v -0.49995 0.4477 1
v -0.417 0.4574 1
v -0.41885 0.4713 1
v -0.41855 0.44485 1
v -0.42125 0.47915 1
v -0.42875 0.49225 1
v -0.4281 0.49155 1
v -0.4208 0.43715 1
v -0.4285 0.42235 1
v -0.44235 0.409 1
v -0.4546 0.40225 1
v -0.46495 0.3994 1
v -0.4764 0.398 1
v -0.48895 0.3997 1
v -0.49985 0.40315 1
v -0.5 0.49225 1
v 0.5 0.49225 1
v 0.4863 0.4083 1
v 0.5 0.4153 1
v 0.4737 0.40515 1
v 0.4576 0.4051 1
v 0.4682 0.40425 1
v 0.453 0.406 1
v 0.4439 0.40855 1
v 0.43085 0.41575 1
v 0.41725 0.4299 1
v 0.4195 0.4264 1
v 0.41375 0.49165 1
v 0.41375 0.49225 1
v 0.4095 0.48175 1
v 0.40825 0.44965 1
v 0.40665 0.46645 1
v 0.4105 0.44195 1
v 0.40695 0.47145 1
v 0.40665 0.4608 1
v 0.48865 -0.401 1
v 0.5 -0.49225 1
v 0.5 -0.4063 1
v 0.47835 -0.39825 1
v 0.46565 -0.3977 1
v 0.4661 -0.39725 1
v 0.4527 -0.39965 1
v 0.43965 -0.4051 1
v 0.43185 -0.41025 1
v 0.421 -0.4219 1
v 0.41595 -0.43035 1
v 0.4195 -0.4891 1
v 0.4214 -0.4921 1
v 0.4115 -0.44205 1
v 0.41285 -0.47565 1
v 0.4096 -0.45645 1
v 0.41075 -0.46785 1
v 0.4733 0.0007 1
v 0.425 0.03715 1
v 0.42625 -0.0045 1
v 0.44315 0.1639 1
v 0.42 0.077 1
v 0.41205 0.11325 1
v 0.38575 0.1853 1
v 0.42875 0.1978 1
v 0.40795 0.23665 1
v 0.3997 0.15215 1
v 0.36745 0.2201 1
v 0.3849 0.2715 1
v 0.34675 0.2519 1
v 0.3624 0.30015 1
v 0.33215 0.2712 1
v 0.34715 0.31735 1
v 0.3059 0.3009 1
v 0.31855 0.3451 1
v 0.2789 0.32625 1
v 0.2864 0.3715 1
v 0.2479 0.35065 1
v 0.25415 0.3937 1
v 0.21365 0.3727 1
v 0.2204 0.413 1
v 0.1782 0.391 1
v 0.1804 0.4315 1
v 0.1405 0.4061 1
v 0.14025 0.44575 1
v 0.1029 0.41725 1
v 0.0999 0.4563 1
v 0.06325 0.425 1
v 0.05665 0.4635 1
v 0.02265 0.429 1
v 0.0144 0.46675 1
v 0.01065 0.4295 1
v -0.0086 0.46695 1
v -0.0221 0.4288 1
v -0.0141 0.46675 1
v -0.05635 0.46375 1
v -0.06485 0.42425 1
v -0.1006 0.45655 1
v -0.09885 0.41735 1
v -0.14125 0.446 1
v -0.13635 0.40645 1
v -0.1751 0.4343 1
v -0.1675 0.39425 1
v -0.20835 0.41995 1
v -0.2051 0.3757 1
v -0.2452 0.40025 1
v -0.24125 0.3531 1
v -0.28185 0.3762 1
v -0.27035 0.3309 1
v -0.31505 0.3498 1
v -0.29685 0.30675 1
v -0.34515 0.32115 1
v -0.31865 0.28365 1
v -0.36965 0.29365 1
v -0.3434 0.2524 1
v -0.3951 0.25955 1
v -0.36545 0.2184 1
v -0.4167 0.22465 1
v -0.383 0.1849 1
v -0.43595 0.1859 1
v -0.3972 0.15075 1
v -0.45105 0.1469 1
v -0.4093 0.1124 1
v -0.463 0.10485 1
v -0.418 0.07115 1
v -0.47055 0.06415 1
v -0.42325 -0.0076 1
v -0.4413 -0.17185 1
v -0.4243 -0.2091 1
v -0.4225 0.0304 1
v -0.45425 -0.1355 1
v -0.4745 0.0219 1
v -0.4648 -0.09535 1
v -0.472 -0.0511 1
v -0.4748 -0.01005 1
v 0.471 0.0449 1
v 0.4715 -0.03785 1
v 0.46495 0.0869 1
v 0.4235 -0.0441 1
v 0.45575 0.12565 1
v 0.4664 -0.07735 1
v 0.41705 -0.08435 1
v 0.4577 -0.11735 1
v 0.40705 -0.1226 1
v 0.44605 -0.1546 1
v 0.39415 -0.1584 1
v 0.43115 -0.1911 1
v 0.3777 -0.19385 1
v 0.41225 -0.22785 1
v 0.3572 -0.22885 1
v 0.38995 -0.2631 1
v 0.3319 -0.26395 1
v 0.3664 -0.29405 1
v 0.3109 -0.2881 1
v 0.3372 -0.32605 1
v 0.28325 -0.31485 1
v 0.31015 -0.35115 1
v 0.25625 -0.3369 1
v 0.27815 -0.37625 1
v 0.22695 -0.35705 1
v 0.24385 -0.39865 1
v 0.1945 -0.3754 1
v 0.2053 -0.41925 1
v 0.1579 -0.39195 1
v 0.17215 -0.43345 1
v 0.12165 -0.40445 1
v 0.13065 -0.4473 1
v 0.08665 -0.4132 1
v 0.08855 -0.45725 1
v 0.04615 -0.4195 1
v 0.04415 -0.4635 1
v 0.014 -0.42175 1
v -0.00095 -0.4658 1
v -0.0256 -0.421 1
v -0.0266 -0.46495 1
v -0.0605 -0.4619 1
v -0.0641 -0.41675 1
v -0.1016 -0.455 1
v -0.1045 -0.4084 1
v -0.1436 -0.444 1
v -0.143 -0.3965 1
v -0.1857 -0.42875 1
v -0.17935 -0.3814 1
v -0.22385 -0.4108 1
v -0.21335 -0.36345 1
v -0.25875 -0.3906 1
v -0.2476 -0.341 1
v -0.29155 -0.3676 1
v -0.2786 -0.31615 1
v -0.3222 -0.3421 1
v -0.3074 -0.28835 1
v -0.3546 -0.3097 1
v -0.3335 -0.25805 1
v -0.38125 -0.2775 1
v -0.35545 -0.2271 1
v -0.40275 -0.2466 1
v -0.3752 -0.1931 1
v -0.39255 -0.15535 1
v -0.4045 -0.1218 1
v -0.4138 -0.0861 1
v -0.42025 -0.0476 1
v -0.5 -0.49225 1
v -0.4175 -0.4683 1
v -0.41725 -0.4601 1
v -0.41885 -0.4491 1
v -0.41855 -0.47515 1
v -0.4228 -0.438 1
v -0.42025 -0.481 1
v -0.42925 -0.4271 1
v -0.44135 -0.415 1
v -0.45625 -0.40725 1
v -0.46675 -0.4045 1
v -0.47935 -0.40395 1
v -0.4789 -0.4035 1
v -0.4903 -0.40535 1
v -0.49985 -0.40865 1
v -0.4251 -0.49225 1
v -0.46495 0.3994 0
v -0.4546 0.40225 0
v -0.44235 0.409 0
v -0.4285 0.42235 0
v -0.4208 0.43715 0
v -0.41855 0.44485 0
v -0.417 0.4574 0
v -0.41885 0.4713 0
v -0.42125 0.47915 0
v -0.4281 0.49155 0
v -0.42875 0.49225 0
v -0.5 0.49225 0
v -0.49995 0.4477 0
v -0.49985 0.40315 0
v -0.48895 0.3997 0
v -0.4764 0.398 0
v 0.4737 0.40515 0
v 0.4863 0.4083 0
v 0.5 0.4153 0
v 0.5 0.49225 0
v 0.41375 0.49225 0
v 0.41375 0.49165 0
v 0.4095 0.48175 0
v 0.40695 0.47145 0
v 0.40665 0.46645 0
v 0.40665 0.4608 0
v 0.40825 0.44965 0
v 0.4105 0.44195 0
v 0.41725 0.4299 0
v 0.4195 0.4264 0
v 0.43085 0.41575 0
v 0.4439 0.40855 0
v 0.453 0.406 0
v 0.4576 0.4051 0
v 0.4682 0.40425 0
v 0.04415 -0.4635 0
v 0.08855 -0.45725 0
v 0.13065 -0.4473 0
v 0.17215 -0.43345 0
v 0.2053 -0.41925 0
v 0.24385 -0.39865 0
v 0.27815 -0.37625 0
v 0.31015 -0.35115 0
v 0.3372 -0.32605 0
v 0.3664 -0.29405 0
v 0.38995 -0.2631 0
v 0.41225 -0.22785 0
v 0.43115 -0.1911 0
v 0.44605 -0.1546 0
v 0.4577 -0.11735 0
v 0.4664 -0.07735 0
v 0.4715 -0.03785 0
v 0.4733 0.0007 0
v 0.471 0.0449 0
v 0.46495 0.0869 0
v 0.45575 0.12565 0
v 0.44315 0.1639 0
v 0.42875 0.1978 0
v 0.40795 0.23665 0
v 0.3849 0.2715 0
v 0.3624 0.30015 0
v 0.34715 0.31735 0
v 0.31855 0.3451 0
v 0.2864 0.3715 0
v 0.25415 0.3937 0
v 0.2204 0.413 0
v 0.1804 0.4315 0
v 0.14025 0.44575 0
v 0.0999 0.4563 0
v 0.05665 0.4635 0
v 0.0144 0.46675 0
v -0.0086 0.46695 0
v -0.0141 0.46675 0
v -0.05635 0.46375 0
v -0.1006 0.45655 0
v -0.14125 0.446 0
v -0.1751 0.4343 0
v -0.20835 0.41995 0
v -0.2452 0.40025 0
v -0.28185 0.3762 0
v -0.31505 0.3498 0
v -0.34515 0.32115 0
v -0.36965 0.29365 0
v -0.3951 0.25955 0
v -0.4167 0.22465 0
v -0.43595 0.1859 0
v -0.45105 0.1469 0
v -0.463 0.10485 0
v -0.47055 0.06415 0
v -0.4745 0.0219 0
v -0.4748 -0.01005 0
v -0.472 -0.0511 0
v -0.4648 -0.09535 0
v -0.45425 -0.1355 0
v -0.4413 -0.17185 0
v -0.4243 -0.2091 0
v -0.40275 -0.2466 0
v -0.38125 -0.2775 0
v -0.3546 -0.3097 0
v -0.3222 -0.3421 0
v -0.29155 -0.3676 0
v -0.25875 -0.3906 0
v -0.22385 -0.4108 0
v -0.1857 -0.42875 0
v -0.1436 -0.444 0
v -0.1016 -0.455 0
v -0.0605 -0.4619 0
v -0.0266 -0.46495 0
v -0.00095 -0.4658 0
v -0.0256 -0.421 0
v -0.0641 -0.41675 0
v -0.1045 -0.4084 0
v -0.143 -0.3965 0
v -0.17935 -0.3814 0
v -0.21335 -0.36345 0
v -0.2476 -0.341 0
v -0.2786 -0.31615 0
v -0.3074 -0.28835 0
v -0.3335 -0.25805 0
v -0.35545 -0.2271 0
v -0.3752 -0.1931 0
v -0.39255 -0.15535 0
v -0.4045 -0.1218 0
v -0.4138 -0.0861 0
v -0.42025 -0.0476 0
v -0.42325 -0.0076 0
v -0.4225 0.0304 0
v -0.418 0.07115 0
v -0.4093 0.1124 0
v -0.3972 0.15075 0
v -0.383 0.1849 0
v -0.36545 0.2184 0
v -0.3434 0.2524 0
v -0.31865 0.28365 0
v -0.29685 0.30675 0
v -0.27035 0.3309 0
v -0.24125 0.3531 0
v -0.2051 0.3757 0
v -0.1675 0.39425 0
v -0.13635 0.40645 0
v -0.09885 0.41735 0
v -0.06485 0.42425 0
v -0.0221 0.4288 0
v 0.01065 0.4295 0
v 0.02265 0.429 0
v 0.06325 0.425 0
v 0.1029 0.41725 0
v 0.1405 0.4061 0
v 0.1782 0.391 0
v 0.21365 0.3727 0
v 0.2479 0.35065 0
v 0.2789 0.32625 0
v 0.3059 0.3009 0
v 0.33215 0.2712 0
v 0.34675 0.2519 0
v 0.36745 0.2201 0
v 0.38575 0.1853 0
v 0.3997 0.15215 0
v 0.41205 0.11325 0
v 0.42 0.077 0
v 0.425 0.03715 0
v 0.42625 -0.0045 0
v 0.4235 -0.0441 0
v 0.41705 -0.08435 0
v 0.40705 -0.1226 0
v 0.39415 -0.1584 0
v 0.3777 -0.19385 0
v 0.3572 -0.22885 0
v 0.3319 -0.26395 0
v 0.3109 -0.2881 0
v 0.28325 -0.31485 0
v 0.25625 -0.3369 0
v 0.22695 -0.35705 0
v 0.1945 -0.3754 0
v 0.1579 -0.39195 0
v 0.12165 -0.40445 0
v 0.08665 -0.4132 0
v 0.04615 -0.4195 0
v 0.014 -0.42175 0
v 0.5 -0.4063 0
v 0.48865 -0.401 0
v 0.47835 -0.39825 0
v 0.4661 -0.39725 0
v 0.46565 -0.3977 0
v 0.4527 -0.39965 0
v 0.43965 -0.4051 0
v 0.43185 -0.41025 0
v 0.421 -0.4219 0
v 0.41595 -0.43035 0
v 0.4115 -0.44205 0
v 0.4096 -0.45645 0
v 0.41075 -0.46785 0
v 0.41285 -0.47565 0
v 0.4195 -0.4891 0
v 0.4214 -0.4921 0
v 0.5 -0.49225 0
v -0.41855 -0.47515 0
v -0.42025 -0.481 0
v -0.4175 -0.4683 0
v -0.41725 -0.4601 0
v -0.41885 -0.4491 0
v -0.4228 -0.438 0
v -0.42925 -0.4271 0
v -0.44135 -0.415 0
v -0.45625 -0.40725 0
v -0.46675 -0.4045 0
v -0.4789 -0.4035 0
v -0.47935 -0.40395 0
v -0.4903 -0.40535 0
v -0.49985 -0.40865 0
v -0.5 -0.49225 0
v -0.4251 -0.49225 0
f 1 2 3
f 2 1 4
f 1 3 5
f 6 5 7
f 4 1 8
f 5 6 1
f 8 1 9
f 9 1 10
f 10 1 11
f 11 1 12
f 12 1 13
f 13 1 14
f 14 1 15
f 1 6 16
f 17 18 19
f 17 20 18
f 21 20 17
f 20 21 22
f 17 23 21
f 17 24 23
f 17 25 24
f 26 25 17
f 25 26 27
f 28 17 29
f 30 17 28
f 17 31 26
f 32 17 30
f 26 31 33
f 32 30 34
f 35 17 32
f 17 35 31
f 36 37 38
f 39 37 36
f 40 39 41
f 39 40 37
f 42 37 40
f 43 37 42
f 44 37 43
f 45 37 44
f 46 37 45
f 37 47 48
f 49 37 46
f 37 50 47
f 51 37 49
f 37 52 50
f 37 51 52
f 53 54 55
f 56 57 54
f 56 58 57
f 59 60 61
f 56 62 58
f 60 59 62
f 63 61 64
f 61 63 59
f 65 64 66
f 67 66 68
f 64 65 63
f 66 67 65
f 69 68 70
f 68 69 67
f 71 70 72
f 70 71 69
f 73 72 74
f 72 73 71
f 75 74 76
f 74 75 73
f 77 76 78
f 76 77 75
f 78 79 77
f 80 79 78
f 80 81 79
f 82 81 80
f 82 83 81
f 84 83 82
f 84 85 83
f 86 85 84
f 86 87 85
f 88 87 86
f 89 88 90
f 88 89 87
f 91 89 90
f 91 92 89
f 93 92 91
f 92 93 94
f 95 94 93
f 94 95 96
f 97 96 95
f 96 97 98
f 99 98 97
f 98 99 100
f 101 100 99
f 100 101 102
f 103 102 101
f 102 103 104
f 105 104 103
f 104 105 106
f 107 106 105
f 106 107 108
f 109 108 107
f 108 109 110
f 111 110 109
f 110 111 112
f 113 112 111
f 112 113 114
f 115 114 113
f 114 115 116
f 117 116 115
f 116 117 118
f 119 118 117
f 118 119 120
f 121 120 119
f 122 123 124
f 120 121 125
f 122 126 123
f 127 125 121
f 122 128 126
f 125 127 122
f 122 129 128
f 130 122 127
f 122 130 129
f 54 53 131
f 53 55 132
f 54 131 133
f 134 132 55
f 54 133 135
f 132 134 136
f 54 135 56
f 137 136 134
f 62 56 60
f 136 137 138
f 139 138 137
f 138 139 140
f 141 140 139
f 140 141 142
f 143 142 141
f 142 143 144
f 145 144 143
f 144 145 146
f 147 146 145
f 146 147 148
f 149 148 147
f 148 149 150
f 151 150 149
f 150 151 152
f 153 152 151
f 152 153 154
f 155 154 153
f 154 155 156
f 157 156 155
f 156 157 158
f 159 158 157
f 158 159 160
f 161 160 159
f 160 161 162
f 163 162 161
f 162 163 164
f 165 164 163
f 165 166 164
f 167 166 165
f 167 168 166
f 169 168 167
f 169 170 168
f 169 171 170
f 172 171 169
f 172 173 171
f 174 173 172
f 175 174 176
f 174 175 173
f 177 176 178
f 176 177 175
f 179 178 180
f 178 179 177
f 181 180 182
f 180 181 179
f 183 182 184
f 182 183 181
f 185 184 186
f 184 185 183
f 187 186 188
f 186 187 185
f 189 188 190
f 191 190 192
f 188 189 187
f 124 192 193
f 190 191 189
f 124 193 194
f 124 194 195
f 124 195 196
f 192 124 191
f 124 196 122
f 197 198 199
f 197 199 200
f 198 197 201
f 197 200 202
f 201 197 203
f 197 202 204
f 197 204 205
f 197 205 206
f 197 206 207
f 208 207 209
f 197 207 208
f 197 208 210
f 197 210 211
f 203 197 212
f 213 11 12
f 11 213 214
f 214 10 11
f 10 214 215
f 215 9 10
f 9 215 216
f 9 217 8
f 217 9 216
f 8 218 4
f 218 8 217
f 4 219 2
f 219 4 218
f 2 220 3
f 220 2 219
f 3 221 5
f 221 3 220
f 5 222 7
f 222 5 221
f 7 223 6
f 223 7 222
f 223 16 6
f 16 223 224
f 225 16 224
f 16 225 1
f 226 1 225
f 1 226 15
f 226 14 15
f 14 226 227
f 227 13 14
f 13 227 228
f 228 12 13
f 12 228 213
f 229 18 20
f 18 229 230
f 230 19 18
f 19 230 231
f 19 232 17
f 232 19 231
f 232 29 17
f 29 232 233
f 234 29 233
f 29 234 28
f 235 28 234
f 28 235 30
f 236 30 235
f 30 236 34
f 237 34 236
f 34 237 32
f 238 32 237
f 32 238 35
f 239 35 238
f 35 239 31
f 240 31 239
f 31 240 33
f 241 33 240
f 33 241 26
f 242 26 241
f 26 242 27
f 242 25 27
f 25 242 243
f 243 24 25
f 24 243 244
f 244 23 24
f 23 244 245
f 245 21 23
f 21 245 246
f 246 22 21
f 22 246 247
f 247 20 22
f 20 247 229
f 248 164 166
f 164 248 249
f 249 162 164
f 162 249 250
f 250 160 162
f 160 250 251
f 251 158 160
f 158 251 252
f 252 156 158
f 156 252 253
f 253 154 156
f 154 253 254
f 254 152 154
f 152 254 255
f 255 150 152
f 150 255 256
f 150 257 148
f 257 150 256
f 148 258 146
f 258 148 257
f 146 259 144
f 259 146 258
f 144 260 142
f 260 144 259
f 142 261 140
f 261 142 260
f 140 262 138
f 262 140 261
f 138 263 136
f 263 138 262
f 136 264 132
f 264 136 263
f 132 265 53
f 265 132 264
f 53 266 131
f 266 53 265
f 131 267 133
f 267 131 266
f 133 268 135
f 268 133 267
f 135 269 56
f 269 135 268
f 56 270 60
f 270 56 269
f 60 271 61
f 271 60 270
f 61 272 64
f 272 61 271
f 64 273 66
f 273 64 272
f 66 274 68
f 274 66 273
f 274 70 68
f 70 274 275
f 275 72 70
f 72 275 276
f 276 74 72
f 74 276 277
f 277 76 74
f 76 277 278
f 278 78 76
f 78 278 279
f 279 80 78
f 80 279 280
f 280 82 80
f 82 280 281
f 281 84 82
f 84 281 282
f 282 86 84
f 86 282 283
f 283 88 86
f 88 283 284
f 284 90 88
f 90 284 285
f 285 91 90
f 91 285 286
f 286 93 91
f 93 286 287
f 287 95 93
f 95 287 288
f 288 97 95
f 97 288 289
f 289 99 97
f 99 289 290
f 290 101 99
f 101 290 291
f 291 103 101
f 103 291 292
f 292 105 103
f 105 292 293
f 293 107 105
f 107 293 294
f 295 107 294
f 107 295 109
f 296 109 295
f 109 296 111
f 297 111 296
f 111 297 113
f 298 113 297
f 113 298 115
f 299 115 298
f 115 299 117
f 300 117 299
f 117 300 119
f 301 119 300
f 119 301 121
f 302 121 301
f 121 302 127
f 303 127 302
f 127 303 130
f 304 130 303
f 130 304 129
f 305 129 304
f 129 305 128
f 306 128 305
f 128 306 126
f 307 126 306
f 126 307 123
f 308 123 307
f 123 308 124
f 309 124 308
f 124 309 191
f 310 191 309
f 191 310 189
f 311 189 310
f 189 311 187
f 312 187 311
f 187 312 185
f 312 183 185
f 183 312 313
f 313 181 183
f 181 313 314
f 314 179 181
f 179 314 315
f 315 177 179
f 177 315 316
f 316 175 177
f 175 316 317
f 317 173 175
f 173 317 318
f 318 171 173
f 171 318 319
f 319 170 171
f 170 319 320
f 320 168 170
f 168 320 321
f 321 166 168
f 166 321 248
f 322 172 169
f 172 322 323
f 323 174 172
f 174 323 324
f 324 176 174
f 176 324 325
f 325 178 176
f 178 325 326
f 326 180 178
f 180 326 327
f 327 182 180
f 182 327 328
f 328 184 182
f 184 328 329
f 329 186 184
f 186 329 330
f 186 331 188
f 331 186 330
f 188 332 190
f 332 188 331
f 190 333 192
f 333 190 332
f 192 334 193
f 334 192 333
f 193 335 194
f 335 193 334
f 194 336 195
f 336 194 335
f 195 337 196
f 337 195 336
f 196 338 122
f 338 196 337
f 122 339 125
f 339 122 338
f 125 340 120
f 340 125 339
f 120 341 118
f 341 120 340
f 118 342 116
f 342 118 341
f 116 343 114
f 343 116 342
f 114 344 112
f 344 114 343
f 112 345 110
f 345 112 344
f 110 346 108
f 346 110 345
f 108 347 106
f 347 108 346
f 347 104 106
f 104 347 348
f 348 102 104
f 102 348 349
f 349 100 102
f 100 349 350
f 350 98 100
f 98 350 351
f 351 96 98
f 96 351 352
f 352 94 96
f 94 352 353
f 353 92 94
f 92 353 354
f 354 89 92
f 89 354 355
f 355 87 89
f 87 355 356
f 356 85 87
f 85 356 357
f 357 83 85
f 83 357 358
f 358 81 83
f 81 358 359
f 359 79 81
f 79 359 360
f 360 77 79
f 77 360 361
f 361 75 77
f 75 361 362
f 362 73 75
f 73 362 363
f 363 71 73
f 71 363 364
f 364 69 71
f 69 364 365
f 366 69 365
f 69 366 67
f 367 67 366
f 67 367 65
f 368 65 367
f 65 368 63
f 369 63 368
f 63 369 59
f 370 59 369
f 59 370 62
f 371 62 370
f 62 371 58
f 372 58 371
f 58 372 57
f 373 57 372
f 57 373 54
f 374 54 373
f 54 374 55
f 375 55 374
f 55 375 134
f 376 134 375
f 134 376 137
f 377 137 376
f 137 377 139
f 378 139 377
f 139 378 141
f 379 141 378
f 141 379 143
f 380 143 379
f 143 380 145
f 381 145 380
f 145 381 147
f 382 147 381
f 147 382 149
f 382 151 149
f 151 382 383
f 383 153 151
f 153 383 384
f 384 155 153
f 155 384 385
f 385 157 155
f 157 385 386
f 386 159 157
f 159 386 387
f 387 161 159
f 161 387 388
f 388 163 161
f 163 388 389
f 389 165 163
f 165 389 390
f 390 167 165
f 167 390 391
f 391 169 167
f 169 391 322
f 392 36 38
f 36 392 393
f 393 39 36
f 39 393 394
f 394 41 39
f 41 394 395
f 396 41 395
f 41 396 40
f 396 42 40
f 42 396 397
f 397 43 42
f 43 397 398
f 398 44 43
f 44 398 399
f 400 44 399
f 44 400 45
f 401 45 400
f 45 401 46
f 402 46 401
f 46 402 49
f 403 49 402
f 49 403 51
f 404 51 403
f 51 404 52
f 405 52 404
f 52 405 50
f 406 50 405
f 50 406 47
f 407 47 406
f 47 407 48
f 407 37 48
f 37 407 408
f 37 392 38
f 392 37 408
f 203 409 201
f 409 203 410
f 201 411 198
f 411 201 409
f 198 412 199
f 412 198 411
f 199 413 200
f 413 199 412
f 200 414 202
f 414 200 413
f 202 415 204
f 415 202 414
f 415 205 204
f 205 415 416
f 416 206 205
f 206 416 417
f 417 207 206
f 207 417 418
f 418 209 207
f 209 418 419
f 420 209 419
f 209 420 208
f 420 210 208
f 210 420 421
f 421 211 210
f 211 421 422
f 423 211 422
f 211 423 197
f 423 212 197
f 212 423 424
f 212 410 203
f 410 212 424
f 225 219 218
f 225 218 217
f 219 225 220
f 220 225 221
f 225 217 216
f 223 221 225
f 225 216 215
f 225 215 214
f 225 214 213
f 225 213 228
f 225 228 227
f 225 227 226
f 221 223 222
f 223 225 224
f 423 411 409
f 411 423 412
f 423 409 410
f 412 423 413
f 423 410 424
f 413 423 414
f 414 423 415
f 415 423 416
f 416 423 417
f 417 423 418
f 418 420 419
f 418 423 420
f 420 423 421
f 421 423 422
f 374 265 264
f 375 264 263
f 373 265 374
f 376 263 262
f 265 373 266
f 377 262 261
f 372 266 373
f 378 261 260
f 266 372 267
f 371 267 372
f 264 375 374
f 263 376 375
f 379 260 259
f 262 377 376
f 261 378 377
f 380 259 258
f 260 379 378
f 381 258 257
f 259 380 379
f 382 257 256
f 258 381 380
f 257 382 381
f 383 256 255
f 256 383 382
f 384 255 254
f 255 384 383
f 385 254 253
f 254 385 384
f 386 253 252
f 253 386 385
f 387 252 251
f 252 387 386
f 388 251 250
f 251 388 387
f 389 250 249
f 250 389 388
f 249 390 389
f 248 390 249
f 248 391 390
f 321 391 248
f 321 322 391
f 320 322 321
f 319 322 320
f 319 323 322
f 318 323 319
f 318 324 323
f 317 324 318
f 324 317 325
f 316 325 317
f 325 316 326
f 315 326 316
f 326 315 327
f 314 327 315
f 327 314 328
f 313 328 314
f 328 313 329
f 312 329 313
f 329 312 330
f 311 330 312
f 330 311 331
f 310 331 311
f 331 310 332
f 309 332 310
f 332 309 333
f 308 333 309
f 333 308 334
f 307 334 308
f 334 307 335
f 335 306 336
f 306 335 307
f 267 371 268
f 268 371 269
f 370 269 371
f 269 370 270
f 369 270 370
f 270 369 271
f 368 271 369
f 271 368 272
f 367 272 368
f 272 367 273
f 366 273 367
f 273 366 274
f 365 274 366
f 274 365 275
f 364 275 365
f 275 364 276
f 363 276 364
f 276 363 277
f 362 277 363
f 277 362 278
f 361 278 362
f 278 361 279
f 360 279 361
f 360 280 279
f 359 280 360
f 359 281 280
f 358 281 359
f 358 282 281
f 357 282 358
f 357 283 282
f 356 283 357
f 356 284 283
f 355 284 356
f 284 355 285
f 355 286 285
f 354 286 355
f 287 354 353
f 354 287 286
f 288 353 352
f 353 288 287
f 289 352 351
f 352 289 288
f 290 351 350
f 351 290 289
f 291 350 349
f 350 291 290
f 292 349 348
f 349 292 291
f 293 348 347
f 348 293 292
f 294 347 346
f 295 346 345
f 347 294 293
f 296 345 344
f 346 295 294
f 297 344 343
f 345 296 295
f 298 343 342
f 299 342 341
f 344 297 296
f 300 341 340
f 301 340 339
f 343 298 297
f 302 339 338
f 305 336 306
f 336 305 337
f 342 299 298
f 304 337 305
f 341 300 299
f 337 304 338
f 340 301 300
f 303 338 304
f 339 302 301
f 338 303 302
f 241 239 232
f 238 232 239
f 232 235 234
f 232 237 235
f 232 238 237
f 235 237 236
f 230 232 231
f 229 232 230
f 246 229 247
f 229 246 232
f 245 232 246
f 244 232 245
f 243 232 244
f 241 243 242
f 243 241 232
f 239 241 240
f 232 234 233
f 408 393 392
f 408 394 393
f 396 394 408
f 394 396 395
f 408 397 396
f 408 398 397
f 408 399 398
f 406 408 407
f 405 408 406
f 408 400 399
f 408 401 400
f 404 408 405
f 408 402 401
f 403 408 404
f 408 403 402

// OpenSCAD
module C3white_1()
{
 /* Generated by trace2scad version 20150415
    http://aggregate.org/MAKE/TRACE2SCAD/
    Optimized model has 217/2306 original points
 */
 color([0.5, 0.5, 0.5])
 assign(minx=0) /* polygon minx=0 */
 assign(miny=0) /* polygon miny=0 */
 assign(maxx=20000) /* polygon maxx=20000 */
 assign(maxy=19690) /* polygon maxy=19690 */
 assign(dx=maxx-minx)
 assign(dy=maxy-miny)
 assign(maxd=((dx>dy)?dx:dy))
 scale([1/maxd, 1/maxd, 1])
 translate([-minx-dx/2, -miny-dy/2, 0])
 linear_extrude(height=1, convexity=217)
 union() {
  union() {
   polygon([[1,18799],[3,17908],[221,17839],[472,17805],[701,17833],[908,17890],[1153,18025],[1430,18292],[1584,18588],[1629,18742],[1660,18993],[1623,19271],[1575,19428],[1438,19676],[1425,19690],[0,19690]], convexity=5);
   polygon([[18275,19684],[18275,19678],[18190,19480],[18139,19274],[18133,19174],[18133,19061],[18165,18838],[18210,18684],[18345,18443],[18390,18373],[18617,18160],[18878,18016],[19060,17965],[19152,17947],[19364,17930],[19474,17948],[19726,18011],[20000,18151],[20000,19690],[18275,19690]], convexity=7);
   union() {
    difference() {
     polygon([[9773,19182],[9718,19180],[8873,19120],[7988,18976],[7175,18765],[6498,18531],[5833,18244],[5096,17850],[4363,17369],[3699,16841],[3097,16268],[2607,15718],[2098,15036],[1666,14338],[1281,13563],[979,12783],[740,11942],[589,11128],[510,10283],[504,9644],[560,8823],[704,7938],[915,7135],[1174,6408],[1514,5663],[1945,4913],[2375,4295],[2908,3651],[3556,3003],[4169,2493],[4825,2033],[5523,1629],[6286,1270],[7128,965],[7968,745],[8790,607],[9468,546],[9981,529],[10883,575],[11771,700],[12613,899],[13443,1176],[14106,1460],[14877,1872],[15563,2320],[16203,2822],[16744,3324],[17328,3964],[17799,4583],[18245,5288],[18623,6023],[18921,6753],[19154,7498],[19328,8298],[19430,9088],[19466,9859],[19420,10743],[19299,11583],[19115,12358],[18863,13123],[18575,13801],[18159,14578],[17698,15275],[17248,15848],[16943,16192],[16371,16747],[15728,17275],[15083,17719],[14408,18105],[13608,18475],[12805,18760],[11998,18971],[11133,19115],[10288,19180],[9828,19184]], convexity=6);
     polygon([[10333,18430],[10453,18425],[11265,18345],[12058,18190],[12810,17967],[13564,17665],[14273,17299],[14958,16858],[15578,16370],[16118,15863],[16643,15269],[16935,14883],[17349,14247],[17715,13551],[17994,12888],[18241,12110],[18400,11385],[18500,10588],[18525,9755],[18470,8963],[18341,8158],[18141,7393],[17883,6677],[17554,5968],[17144,5268],[16638,4566],[16218,4083],[15665,3548],[15125,3107],[14539,2704],[13890,2337],[13158,2006],[12433,1756],[11733,1581],[10923,1455],[10280,1410],[9488,1425],[8718,1510],[7910,1677],[7140,1915],[6413,2217],[5733,2576],[5048,3025],[4428,3522],[3852,4078],[3330,4684],[2891,5303],[2496,5983],[2149,6738],[1910,7409],[1724,8123],[1595,8893],[1535,9693],[1550,10453],[1640,11268],[1814,12093],[2056,12860],[2340,13543],[2691,14213],[3132,14893],[3627,15518],[4063,15980],[4593,16463],[5175,16907],[5898,17359],[6650,17730],[7273,17974],[8023,18192],[8703,18330],[9558,18421],[10213,18435]], convexity=6);
    }
   }
   polygon([[19317,1895],[19313,1891],[19054,1852],[18793,1743],[18637,1640],[18420,1407],[18319,1238],[18230,1004],[18192,716],[18215,488],[18257,332],[18390,63],[18428,3],[20000,0],[20000,1719],[19773,1825],[19567,1880],[19322,1900]], convexity=6);
   polygon([[417,1770],[413,1766],[194,1738],[3,1672],[0,0],[1498,0],[1595,225],[1629,342],[1650,479],[1655,643],[1623,863],[1544,1085],[1415,1303],[1173,1545],[875,1700],[665,1755],[422,1775]], convexity=5);
  }
 }
}

module C3white()
{
 /* all layers combined, scaled to within a 1mm cube */
 scale([1, 1, 1/1])
 difference() {
  union() {
   scale([1,1,2]) translate([0,0,-0.5]) C3white_1();
  }
  translate([0,0,-2]) cube([2,2,4],center=true);
 }
}
C3white();
